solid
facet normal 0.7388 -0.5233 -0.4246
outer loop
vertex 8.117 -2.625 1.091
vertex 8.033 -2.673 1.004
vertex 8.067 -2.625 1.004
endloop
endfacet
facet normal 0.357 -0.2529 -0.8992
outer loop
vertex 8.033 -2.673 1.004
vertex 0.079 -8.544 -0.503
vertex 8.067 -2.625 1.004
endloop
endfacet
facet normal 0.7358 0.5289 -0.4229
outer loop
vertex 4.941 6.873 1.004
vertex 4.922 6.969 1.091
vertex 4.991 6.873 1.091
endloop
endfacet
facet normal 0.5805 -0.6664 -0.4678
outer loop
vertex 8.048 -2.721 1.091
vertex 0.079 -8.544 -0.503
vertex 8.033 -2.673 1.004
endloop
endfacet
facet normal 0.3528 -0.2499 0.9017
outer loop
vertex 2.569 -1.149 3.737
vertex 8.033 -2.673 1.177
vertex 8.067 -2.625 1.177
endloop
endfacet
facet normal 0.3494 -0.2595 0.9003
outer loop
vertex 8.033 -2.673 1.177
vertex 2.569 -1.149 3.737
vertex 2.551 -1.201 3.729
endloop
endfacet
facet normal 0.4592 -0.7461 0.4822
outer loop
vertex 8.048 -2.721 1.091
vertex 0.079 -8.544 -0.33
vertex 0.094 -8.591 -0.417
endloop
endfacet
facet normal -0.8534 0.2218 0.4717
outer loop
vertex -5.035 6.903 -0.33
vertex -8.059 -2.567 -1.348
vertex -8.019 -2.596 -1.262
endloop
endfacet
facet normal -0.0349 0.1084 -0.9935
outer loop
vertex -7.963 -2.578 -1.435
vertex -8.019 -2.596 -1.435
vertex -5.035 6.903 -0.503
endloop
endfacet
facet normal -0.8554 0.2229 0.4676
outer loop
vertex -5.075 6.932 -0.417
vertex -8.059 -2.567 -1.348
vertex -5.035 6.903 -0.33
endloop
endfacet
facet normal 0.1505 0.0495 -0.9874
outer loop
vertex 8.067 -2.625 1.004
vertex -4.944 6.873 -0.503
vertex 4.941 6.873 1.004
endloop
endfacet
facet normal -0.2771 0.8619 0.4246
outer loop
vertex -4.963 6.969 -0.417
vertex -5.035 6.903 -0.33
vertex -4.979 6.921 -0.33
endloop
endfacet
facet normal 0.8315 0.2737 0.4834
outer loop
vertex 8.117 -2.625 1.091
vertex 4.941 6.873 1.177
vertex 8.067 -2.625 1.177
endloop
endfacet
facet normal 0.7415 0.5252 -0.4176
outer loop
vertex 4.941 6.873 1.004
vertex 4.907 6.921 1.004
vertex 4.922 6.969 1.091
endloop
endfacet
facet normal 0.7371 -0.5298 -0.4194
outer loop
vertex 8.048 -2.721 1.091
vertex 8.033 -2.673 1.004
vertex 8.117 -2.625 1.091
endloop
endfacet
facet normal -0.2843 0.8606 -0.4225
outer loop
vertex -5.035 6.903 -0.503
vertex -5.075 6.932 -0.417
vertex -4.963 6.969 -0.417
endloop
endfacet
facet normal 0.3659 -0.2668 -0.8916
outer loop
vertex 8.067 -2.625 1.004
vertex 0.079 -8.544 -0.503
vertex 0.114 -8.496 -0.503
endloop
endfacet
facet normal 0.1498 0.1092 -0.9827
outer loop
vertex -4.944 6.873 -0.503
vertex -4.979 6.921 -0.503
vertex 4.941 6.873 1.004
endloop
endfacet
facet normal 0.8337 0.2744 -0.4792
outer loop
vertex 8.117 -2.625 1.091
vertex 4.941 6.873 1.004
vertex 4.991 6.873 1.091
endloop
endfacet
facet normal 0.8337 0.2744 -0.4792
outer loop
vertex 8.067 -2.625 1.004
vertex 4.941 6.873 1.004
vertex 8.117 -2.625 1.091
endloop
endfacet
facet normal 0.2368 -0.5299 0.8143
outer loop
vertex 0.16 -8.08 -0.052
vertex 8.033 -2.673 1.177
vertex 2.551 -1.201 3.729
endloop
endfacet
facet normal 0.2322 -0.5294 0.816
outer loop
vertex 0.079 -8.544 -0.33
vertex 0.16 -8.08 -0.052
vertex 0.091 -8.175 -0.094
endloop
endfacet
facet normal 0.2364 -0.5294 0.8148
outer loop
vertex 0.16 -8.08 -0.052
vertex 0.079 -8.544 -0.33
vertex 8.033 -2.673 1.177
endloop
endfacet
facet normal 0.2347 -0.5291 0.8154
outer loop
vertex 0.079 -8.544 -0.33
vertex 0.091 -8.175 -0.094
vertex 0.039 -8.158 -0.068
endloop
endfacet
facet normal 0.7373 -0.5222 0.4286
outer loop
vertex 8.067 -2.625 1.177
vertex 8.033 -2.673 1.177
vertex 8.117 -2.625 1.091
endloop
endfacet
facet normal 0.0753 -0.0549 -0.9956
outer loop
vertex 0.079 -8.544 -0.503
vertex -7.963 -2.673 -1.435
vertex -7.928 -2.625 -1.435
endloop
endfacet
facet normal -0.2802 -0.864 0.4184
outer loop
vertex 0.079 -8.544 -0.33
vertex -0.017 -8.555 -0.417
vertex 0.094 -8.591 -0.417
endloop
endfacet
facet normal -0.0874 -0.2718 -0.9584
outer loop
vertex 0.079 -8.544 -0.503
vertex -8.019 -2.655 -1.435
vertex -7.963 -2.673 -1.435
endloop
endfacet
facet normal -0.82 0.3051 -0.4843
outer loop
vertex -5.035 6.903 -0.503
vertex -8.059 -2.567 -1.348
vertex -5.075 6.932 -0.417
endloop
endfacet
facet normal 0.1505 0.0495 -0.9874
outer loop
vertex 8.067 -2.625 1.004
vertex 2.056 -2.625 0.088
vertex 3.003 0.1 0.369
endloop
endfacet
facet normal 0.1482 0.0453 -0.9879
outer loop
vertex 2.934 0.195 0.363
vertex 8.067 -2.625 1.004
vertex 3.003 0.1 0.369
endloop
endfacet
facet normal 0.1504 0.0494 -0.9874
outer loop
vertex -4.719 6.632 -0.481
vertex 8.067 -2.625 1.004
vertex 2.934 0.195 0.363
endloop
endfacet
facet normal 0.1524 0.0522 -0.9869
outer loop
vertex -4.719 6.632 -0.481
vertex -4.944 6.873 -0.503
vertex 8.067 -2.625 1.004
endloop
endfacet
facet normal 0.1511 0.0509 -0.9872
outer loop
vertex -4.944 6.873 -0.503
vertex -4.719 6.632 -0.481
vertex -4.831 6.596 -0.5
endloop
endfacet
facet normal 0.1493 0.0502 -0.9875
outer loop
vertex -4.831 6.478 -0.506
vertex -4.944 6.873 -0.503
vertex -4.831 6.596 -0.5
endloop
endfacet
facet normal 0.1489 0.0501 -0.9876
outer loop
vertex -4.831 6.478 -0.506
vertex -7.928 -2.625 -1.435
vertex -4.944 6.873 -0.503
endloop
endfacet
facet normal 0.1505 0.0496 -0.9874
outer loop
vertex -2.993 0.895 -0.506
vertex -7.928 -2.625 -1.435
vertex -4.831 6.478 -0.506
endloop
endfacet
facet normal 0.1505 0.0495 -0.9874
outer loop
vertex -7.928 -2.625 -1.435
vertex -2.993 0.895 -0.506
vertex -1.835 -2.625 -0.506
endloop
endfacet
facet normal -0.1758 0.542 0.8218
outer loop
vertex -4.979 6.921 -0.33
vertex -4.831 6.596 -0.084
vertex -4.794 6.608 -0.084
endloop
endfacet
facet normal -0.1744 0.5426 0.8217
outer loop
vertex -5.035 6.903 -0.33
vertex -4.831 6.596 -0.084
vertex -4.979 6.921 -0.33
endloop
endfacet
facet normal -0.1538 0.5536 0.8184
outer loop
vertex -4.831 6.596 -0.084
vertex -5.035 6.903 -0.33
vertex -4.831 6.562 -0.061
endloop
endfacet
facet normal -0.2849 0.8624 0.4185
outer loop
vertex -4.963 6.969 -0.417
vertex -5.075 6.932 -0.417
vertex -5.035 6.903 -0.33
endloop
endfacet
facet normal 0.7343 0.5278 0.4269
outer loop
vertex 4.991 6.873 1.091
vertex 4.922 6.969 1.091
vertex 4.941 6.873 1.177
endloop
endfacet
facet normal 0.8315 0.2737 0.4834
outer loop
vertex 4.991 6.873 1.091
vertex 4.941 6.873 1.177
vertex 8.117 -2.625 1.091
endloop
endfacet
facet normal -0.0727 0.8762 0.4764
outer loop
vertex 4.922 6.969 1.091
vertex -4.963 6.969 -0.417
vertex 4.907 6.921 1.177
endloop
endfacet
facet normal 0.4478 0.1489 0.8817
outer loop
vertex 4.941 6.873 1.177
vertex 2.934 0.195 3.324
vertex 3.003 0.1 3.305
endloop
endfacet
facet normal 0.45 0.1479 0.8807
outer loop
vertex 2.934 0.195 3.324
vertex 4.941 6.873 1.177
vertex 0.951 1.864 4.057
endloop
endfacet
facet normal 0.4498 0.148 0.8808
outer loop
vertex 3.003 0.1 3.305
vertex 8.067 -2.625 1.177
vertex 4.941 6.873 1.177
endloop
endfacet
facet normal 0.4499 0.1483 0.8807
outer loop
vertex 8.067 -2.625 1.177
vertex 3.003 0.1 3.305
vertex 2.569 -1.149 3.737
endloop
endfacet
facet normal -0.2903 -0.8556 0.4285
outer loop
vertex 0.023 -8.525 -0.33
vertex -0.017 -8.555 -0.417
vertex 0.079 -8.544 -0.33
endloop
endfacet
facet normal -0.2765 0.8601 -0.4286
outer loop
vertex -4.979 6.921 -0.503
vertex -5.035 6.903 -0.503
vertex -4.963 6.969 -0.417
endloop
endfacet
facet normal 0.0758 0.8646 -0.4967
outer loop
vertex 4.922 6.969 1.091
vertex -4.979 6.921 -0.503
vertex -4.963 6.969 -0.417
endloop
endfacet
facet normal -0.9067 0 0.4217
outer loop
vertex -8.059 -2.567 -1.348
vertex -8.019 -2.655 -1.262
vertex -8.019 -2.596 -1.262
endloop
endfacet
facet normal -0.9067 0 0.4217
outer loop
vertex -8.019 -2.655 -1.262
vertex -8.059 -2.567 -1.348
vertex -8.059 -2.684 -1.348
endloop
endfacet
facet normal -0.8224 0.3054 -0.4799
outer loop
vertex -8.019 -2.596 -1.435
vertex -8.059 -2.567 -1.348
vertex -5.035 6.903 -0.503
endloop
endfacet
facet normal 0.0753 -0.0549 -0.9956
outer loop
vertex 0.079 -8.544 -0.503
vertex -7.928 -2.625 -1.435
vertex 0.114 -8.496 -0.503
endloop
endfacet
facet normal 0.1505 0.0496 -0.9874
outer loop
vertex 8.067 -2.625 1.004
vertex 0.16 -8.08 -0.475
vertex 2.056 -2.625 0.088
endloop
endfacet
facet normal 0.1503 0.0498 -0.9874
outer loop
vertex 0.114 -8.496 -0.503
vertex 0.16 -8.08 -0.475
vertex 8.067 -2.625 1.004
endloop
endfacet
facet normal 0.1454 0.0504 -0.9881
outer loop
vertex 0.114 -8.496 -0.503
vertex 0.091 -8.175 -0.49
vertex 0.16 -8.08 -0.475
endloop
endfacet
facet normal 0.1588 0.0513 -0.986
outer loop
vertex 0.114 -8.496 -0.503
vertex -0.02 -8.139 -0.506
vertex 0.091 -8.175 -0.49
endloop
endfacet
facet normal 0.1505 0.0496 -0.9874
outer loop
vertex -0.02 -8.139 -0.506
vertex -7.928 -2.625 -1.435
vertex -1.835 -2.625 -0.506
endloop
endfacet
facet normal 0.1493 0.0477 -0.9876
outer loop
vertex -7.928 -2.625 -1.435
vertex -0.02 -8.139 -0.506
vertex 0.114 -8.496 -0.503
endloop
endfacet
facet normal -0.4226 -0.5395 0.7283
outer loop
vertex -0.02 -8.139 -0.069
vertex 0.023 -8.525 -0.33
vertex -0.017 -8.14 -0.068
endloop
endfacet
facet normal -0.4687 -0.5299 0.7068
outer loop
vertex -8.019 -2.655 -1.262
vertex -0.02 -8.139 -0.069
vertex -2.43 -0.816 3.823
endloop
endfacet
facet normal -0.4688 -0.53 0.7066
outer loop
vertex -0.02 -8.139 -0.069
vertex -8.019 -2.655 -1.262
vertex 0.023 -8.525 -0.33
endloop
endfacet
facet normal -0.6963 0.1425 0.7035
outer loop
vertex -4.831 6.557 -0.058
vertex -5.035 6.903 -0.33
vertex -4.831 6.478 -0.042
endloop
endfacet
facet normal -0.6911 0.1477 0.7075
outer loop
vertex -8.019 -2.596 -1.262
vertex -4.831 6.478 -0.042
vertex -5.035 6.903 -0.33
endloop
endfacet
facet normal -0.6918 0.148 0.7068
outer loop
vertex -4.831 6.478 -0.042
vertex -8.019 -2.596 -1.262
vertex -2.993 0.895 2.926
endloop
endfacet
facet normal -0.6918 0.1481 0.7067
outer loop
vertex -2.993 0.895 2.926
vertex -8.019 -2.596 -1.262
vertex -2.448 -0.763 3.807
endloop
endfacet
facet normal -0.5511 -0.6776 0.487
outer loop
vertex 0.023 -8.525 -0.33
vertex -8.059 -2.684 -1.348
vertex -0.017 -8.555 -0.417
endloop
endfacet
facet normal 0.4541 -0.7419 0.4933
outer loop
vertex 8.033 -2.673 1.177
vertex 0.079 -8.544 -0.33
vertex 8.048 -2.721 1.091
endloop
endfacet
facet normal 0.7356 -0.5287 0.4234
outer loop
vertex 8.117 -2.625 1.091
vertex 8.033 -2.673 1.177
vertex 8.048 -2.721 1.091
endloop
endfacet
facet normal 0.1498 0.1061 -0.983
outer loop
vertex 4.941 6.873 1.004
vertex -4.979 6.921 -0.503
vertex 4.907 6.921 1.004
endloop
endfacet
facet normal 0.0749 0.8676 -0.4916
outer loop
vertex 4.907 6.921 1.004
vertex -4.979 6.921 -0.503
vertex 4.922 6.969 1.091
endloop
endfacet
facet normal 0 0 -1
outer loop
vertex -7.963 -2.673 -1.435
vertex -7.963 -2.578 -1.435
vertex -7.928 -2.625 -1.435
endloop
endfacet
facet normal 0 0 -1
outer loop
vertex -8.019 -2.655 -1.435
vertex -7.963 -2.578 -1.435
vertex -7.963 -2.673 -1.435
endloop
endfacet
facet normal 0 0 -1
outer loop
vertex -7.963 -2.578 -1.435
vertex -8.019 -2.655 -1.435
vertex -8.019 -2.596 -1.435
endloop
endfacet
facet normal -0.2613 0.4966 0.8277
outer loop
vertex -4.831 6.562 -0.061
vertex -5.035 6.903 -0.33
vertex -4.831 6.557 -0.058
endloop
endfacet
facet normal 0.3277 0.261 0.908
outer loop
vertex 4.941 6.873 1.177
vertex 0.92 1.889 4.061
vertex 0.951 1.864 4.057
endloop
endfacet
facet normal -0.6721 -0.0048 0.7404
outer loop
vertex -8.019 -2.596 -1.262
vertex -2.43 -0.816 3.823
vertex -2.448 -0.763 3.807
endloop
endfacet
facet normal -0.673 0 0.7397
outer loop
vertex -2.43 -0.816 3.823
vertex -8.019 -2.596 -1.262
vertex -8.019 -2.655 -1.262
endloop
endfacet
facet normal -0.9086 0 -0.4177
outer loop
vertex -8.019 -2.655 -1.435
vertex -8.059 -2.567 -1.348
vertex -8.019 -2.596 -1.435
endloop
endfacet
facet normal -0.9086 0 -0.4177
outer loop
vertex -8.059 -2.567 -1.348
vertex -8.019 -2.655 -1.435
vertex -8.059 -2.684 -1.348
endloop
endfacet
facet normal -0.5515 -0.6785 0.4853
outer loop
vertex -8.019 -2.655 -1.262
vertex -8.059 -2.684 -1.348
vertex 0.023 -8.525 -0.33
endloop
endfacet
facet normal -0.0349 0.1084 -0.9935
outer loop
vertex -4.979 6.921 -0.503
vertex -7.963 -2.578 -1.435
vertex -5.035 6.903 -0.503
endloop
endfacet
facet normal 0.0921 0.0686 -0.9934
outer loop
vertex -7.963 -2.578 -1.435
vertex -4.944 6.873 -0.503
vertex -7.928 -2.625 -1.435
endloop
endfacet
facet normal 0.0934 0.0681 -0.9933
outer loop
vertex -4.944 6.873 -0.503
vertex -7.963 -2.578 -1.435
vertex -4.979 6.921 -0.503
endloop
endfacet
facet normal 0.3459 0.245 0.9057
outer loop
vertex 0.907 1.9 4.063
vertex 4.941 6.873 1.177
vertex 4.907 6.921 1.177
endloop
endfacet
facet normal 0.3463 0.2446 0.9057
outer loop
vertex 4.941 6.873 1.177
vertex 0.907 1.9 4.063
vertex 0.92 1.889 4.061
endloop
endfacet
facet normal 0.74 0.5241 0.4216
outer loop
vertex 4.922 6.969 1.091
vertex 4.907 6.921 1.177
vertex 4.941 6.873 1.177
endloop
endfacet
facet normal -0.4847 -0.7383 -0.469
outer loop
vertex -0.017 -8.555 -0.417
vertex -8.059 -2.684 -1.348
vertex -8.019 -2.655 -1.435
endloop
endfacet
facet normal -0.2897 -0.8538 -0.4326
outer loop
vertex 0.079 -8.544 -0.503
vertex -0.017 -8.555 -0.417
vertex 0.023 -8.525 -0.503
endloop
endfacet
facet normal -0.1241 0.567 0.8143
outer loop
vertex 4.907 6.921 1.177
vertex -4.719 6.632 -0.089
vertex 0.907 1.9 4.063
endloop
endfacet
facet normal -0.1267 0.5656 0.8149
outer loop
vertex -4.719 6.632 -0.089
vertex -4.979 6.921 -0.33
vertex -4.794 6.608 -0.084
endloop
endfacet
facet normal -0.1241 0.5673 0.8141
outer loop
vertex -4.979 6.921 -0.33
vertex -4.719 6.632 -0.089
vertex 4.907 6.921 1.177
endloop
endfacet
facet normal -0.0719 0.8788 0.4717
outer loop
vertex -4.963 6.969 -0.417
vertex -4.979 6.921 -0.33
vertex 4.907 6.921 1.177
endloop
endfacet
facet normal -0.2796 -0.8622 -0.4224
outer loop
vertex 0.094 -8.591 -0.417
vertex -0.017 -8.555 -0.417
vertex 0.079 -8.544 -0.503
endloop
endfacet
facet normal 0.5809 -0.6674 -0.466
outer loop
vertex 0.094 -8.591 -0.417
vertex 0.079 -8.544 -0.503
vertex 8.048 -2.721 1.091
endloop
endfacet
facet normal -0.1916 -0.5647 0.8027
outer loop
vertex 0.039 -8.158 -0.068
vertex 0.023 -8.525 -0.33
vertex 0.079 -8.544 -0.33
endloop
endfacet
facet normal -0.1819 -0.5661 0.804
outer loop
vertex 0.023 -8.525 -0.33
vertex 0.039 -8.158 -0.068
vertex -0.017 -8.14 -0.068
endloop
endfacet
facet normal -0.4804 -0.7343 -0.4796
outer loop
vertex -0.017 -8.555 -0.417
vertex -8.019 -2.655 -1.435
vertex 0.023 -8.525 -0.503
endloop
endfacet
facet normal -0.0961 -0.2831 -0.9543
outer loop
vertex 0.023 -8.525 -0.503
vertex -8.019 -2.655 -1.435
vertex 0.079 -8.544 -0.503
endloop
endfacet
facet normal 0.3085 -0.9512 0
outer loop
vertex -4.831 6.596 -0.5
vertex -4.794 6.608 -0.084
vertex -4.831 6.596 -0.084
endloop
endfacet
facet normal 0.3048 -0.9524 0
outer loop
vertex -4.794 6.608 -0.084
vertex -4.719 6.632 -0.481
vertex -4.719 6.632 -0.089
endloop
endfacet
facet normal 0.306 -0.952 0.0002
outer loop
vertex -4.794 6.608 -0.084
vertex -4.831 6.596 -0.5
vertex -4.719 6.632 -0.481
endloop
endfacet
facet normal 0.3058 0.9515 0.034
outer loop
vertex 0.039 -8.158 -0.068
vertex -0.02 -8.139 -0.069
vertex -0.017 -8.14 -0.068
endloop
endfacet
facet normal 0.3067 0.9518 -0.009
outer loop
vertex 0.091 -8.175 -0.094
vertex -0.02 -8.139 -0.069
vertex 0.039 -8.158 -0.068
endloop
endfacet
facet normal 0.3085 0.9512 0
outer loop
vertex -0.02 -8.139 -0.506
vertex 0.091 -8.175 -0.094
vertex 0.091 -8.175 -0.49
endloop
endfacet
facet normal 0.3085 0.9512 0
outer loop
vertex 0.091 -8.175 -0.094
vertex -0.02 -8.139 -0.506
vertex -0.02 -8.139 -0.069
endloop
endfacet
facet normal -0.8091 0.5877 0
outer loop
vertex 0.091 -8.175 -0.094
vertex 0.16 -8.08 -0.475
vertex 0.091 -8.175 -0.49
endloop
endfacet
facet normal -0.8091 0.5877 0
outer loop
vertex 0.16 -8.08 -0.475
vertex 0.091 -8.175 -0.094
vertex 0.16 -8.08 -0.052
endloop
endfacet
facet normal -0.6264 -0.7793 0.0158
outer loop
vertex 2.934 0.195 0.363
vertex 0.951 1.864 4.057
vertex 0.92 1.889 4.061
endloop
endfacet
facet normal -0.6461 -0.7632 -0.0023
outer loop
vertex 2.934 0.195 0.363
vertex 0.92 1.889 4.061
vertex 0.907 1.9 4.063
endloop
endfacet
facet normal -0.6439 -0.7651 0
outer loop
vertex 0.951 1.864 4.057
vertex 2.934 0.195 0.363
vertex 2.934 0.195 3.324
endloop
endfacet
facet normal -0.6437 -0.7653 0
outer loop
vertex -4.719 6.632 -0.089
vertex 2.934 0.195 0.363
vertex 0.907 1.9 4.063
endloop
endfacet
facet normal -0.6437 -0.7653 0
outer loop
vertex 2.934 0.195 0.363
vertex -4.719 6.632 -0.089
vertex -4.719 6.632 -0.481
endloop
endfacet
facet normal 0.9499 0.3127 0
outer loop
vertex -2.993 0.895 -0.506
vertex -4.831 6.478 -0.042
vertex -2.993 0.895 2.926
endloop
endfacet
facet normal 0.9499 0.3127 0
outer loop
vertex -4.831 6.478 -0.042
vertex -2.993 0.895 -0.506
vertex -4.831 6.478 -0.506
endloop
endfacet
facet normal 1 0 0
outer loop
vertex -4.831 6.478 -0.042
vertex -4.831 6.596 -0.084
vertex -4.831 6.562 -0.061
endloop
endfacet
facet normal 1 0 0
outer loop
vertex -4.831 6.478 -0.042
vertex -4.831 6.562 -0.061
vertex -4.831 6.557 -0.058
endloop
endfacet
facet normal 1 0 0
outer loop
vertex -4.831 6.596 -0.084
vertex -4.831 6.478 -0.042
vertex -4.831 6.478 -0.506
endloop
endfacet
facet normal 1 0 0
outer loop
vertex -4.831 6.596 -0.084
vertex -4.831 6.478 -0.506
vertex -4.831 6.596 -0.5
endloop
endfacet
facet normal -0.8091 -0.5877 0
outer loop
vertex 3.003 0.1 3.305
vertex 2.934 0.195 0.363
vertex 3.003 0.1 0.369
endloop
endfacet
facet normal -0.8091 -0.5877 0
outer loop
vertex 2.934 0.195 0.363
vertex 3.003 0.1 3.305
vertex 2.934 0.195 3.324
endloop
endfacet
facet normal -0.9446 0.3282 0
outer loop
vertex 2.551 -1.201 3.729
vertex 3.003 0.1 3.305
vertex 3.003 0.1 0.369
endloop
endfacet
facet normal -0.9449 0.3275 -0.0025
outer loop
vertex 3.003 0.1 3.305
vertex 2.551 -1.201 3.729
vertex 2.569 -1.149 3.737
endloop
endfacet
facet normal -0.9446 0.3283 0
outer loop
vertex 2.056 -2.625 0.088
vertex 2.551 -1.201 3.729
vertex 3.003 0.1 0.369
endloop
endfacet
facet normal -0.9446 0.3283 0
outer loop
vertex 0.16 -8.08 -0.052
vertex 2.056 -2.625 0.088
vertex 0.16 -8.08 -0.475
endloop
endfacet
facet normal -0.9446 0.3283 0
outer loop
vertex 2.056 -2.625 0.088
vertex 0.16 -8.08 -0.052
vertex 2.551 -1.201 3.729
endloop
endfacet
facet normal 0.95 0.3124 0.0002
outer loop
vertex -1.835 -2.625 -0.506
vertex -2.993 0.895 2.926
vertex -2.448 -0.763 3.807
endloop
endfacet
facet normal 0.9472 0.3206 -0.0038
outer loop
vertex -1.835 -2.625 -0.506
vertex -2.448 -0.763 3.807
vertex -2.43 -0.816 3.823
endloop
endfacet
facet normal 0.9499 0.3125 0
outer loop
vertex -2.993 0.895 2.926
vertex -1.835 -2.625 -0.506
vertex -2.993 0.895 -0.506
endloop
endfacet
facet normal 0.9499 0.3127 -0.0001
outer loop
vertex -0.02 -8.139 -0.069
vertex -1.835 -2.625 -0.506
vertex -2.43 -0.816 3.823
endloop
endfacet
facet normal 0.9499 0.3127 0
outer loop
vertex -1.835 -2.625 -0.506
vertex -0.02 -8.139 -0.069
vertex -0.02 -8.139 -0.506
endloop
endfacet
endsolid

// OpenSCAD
// Auto-generated OpenSCAD file

    inner_points = 10*[[0.006041051977101475, -0.8080237563375162, 0.5000000000006635], [-0.29124754295317146, 0.09537426696641924, -0.8090169943752008], [-0.29124754295042443, 0.09537426696896514, 0.8090169943746941], [-0.47498199908503275, 0.6537049507402669, -8.199552148369094e-13], [0.006041051975403666, -0.8080237563390895, -0.49999999999933664], [0.2903071489285415, 0.010018287888955535, -1.106413997394639e-12]];

    outer_points = 10*[[-0.7978099914491895, -0.2625428334534335, -0.13482312819418532], [0.8017357049911781, -0.2625428334534335, 0.10907757649728182], [-0.49942562922089523, 0.687346061483792, -0.04166809798888336], [0.4891479777378736, 0.687346061483792, 0.10907082739049428], [0.006351937941033116, -0.8496064560607167, -0.04165717770470741], [-0.07915084916165496, -0.02604313074481797, 0.5190858316964722]];

    // Convex hull for inner set (I)
    module inner_hull() {
        hull() {
            for (p = inner_points) {
                translate(p) sphere(r=0.1);
            }
        }
    }

    // Convex hull for outer set (O) minus inner hull (O \ I)
    module outer_minus_inner() {
        difference() {
            hull() {
                for (p = outer_points) {
                    translate(p) sphere(r=0.1);
                }
            }
            inner_hull(); // Subtract inner hull
        }
    }

    // Convex hull for outer set (O) minus all translated inner hulls
    module outer_minus_AllTranslationInner() {
        difference() {
            hull() {
                for (p = outer_points) {
                    translate(p) sphere(r=0.1);
                }
            }
            hull() {
                translate([0,0,50]) inner_hull();
                translate([0,0,-50]) inner_hull();
            }; // Subtract translated inner hulls
        }
    }

    // Difference between outer_minus_inner and outer_minus_AllTranslationInner
    module outer_minus_inner_diff() {
        difference() {
            // Outer minus inner
            difference() {
                hull() {
                    for (p = outer_points) {
                        translate(p) sphere(r=0.1);
                    }
                }
                inner_hull();
            }

            // Subtract Outer minus AllTranslationInner
            difference() {
                hull() {
                    for (p = outer_points) {
                        translate(p) sphere(r=0.1);
                    }
                }
                hull() {
                    translate([0,0,50]) inner_hull();
                    translate([0,0,-50]) inner_hull();
                };
            }
        }
    }

    // Rendering all with colors applied
    color([0, 1, 0, 1]) outer_minus_AllTranslationInner(); // Opaque green
    
